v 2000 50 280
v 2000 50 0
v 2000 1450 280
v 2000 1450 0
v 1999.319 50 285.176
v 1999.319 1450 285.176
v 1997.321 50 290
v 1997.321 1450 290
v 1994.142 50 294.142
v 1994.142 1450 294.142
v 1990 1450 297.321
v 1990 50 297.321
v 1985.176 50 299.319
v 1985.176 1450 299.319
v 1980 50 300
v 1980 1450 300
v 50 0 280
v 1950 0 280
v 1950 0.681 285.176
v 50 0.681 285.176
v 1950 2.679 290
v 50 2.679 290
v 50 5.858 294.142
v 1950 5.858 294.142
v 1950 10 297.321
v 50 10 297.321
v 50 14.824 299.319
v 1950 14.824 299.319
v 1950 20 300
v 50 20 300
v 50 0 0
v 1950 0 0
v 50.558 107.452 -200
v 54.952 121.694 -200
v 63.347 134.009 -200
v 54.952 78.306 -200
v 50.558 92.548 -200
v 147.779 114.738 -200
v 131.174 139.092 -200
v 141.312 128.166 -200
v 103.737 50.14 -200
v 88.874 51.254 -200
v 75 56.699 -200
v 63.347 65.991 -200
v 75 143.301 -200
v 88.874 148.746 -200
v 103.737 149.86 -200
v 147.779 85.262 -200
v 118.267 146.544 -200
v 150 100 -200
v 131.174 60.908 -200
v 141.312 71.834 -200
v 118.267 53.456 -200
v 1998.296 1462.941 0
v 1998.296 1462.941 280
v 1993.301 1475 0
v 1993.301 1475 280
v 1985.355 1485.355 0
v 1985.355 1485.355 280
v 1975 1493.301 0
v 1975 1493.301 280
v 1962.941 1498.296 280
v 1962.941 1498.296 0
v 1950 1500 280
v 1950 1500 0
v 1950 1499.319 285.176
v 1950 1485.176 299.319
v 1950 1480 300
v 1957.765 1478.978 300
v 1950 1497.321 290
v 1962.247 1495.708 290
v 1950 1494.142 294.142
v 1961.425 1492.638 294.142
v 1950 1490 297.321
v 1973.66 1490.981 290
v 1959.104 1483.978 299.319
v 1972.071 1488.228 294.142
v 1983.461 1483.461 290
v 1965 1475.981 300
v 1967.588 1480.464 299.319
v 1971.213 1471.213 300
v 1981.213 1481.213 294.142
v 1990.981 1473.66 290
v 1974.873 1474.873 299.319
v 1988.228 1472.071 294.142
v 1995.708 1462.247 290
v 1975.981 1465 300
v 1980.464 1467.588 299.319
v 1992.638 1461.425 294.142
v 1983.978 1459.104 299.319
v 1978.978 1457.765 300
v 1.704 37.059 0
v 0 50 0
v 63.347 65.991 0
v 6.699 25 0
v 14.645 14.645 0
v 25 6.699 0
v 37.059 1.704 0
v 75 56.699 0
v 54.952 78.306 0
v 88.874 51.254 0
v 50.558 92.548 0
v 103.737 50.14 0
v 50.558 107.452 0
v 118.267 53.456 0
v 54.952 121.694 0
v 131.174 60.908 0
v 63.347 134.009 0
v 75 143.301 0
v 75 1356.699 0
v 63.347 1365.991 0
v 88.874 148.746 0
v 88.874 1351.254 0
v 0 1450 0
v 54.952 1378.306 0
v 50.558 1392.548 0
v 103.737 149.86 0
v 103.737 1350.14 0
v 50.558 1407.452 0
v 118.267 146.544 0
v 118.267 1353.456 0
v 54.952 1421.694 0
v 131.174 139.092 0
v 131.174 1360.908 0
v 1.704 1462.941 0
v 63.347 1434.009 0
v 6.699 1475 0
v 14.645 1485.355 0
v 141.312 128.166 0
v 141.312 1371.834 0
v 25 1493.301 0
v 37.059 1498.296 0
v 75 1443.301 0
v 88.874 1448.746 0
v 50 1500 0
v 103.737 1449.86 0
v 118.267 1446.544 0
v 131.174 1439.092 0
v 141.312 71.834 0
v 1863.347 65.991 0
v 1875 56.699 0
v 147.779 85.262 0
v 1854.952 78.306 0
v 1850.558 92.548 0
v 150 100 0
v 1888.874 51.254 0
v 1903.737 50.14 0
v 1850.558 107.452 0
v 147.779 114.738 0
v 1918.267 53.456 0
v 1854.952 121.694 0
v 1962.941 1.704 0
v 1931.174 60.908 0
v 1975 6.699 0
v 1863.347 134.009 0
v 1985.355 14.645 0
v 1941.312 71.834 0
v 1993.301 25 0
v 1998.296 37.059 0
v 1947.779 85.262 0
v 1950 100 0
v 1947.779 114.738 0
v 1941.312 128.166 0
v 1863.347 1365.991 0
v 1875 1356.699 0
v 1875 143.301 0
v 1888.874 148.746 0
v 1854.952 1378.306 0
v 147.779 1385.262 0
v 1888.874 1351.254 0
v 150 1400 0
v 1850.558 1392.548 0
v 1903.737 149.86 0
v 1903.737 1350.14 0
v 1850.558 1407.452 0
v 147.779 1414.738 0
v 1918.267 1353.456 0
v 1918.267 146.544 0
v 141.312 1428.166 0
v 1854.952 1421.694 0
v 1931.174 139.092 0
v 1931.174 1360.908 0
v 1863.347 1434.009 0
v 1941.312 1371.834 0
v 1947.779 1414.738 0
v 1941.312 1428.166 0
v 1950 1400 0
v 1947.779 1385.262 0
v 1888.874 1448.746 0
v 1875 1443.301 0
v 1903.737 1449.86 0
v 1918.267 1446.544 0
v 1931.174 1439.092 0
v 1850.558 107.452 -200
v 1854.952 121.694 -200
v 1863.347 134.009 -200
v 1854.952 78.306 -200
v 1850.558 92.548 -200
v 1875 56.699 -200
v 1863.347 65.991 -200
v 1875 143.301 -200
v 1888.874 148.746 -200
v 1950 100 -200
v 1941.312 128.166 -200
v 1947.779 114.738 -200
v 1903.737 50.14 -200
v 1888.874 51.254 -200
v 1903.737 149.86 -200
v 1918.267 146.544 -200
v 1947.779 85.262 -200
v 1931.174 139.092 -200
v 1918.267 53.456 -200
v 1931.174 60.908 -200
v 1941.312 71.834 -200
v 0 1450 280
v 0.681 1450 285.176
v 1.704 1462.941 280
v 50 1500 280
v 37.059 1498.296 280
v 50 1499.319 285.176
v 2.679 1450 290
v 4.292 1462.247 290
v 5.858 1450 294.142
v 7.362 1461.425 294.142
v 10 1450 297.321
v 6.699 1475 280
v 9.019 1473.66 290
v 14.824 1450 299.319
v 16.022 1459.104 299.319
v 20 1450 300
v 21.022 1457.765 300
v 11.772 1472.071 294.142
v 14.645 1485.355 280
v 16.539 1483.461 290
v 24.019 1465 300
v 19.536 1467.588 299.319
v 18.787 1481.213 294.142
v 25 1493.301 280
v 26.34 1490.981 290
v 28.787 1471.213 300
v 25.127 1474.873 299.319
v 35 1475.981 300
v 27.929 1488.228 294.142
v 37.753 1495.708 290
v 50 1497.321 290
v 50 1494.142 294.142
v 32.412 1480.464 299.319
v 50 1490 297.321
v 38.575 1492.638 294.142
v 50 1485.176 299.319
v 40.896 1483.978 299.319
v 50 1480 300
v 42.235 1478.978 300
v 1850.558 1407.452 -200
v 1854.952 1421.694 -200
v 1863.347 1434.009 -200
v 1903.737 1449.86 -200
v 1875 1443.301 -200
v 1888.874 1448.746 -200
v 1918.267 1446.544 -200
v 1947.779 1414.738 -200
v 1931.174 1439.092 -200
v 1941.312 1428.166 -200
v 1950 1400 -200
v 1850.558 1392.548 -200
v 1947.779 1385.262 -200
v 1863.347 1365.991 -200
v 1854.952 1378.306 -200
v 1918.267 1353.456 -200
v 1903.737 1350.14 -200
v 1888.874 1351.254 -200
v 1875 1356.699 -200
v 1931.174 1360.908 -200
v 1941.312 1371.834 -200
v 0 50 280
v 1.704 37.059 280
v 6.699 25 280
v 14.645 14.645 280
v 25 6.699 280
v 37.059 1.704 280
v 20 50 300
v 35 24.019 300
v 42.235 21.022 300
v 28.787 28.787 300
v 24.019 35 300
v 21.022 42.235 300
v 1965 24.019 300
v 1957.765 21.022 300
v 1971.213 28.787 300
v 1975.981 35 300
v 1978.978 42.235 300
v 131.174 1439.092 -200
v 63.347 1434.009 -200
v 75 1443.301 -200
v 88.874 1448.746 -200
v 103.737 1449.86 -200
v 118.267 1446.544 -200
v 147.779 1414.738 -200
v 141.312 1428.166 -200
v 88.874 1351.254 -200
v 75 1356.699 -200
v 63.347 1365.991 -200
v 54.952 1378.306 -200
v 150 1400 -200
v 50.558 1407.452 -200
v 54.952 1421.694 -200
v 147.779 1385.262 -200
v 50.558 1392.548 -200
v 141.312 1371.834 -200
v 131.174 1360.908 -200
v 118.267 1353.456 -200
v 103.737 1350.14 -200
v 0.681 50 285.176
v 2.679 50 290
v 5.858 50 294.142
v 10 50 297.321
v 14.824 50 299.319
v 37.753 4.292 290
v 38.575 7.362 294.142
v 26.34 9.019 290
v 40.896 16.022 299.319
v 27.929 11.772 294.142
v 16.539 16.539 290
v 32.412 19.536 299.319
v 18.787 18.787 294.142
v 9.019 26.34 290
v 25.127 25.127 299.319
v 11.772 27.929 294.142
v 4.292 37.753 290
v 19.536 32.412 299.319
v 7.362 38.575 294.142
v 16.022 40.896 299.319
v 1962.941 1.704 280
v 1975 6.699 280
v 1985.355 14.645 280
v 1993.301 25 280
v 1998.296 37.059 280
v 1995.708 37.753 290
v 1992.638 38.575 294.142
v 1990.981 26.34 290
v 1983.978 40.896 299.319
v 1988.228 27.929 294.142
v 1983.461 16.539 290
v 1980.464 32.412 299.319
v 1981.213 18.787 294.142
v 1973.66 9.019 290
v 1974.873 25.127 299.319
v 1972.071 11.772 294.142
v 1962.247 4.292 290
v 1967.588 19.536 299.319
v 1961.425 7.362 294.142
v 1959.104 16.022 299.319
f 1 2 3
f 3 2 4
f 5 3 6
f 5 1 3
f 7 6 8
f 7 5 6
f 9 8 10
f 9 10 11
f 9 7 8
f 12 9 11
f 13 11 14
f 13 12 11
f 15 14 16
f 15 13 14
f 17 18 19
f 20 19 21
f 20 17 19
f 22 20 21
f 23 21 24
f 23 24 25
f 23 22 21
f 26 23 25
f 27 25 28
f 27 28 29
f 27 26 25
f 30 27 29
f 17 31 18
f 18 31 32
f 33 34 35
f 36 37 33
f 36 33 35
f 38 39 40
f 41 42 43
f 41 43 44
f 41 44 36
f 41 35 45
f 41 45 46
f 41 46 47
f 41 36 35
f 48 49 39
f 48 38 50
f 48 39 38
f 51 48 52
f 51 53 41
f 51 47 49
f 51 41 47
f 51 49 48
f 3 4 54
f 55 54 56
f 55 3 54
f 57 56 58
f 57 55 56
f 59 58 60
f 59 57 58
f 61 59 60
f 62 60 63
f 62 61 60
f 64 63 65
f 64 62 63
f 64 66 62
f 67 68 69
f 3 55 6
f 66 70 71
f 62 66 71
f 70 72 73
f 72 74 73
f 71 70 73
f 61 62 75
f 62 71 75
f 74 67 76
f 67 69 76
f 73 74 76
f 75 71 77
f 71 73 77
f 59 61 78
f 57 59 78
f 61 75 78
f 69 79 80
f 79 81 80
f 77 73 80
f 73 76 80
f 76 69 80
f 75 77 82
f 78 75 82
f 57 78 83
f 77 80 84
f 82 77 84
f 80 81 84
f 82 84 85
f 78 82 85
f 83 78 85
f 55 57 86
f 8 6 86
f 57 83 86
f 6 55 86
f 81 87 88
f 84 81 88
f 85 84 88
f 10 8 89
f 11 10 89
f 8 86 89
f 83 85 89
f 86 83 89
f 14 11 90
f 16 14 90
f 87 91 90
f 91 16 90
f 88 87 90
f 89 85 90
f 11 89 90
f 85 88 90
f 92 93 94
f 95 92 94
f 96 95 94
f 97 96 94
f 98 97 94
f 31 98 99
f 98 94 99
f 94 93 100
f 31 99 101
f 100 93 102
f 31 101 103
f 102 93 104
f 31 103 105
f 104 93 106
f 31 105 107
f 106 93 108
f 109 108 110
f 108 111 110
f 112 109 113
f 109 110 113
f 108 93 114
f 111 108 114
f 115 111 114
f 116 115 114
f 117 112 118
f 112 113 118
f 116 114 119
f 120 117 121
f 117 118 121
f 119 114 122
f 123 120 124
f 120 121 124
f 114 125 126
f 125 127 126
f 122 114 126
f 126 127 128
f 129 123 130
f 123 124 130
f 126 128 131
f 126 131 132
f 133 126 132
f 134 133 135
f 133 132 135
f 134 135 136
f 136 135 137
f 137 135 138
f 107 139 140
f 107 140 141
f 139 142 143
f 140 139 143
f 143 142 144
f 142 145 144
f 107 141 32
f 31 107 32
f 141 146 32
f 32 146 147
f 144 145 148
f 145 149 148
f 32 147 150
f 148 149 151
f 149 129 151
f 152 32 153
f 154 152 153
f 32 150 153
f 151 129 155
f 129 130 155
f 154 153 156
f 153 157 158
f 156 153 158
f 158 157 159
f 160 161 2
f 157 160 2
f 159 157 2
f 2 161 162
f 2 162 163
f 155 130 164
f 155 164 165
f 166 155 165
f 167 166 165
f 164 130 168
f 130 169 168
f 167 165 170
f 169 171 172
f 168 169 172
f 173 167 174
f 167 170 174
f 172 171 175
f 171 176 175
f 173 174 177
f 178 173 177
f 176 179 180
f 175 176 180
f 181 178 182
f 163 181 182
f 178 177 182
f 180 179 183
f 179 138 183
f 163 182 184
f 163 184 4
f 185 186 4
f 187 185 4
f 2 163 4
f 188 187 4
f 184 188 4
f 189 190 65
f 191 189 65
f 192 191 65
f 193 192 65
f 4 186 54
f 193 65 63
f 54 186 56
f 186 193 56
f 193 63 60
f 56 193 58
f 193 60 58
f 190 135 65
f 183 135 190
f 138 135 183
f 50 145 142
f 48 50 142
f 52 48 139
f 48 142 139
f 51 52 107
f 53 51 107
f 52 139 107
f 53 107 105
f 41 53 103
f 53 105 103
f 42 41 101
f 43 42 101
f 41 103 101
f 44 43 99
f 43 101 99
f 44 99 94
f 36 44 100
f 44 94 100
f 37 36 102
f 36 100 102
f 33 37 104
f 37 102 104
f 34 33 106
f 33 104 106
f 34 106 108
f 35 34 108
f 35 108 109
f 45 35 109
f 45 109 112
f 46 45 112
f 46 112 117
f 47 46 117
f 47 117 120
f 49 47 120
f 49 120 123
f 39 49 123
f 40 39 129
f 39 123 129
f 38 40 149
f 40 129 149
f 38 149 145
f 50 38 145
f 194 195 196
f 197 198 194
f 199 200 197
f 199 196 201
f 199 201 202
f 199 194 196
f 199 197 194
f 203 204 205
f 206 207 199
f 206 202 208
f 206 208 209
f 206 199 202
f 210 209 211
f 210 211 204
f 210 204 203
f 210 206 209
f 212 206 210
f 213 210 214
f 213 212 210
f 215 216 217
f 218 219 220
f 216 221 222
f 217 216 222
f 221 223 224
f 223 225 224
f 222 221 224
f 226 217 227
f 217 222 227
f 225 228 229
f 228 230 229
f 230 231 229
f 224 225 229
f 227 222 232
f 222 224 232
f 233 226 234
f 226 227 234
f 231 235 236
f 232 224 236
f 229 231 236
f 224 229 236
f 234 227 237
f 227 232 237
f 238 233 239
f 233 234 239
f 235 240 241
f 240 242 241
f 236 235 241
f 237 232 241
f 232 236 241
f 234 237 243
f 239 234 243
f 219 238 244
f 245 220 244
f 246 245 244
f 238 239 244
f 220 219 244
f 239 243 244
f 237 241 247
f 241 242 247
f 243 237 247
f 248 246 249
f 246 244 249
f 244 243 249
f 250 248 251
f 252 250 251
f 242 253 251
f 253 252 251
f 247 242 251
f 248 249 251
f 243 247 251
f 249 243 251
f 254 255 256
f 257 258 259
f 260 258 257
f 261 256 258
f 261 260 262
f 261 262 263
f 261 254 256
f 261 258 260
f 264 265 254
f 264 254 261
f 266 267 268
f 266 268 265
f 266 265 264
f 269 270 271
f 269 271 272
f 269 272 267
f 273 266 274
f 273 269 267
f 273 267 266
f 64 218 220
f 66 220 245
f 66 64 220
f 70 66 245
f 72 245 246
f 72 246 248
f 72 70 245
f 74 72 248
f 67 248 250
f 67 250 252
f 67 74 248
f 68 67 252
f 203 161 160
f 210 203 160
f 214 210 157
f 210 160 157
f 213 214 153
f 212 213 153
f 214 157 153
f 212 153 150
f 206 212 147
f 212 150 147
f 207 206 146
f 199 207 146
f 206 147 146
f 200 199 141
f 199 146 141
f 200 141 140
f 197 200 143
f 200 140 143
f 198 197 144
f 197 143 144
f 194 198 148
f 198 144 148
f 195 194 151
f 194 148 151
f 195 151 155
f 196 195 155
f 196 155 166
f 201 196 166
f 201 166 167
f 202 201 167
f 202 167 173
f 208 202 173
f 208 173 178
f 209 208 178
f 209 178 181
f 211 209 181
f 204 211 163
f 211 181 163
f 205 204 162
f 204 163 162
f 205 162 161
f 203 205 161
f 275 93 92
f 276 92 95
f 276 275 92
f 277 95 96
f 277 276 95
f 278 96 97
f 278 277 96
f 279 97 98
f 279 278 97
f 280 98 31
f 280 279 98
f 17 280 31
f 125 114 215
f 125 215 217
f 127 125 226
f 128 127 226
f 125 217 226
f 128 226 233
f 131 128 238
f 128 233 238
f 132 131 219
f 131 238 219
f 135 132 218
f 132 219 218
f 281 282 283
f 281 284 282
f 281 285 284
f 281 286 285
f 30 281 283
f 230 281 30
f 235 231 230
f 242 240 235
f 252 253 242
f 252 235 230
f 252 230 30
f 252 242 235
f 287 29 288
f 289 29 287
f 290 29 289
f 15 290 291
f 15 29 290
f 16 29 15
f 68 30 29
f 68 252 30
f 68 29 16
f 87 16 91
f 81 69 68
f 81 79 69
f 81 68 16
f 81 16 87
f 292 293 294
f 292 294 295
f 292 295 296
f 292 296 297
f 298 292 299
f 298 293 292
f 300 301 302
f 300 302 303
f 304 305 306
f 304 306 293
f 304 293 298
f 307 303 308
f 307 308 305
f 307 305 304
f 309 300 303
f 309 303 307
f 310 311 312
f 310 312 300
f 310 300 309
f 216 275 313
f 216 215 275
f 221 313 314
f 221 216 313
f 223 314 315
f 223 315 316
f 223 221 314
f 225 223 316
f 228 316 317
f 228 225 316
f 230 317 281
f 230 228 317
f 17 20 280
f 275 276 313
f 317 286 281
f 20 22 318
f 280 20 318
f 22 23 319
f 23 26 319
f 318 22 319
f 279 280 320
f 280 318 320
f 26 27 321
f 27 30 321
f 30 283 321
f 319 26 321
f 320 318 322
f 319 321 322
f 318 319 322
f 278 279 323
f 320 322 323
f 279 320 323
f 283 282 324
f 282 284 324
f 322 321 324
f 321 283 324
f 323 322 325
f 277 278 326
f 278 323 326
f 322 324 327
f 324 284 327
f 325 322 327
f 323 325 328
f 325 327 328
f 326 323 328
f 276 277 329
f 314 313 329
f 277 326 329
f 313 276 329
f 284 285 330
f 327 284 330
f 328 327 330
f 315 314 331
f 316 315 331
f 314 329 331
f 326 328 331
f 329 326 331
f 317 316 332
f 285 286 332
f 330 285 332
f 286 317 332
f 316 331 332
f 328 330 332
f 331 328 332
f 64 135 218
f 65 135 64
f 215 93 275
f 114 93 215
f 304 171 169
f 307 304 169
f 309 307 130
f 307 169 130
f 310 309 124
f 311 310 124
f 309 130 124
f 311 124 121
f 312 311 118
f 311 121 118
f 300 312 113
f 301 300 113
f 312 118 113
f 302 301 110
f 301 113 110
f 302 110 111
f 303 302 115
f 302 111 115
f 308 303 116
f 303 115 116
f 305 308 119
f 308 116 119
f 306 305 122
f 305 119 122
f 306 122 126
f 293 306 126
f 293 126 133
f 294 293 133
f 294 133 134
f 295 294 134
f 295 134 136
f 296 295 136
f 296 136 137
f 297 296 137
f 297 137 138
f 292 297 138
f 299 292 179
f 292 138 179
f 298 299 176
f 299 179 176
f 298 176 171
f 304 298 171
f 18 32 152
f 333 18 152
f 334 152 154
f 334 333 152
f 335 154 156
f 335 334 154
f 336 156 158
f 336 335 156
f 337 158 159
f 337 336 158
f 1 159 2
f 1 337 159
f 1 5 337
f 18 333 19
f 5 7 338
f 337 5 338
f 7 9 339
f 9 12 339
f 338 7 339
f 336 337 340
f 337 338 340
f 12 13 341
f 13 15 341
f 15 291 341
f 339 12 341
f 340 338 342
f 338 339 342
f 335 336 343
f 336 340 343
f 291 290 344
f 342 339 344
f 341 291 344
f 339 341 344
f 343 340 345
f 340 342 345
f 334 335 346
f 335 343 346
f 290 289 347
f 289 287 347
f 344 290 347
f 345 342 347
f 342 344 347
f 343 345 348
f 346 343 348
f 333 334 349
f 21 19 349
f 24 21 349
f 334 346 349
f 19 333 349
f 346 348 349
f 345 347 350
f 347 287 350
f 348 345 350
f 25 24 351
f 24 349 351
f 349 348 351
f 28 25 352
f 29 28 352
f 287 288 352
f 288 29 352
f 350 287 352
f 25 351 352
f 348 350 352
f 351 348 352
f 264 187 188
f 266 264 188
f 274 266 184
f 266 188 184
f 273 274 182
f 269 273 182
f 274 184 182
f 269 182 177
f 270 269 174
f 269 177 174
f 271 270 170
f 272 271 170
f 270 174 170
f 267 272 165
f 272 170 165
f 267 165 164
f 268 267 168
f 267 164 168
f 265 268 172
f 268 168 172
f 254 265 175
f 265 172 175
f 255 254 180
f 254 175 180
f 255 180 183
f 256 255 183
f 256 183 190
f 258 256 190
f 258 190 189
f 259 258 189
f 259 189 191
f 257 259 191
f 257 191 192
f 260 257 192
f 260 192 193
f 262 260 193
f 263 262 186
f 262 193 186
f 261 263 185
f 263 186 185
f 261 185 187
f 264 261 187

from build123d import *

# Parameters (mm, degrees)
F0_W     = 2000
F0_H     = 1500
F1_DEPTH = 300
F2_R     = 50
F3_R     = 20
F4_R     = 50
F5_DEPTH = 200


with BuildPart() as f1:
    # F0 (on Top) → F1 (new body)
    with BuildSketch(Plane.XY):
        with Locations((1000, 750)):
            Rectangle(F0_W, F0_H)
    extrude(amount=F1_DEPTH)

    # F2
    f2_edges = [f1.edges().sort_by_distance(p)[0] for p in [
        (2000, 0, 150),
        (2000, 1500, 150),
        (0, 0, 150),
        (0, 1500, 150),
    ]]
    fillet(f2_edges, radius=F2_R)

    # F3
    f3_edges = [f1.edges().sort_by_distance(p)[0] for p in [
        (0, 750, 300),
        (14.644661, 1485.355339, 300),
        (14.644661, 14.644661, 300),
        (1000, 1500, 300),
        (1000, 0, 300),
        (1985.355339, 1485.355339, 300),
        (1985.355339, 14.644661, 300),
        (2000, 750, 300),
    ]]
    fillet(f3_edges, radius=F3_R)

    # F4 (on face) → F5 (join)
    with BuildSketch(Plane(origin=(0, 0, 0), x_dir=(1, 0, 0), z_dir=(0, 0, -1))):
        with Locations((100, -100)):
            Circle(F4_R)
        with Locations((100, -1400)):
            Circle(F4_R)
        with Locations((1900, -100)):
            Circle(F4_R)
        with Locations((1900, -1400)):
            Circle(F4_R)
    extrude(amount=F5_DEPTH)


solid = f1.part
